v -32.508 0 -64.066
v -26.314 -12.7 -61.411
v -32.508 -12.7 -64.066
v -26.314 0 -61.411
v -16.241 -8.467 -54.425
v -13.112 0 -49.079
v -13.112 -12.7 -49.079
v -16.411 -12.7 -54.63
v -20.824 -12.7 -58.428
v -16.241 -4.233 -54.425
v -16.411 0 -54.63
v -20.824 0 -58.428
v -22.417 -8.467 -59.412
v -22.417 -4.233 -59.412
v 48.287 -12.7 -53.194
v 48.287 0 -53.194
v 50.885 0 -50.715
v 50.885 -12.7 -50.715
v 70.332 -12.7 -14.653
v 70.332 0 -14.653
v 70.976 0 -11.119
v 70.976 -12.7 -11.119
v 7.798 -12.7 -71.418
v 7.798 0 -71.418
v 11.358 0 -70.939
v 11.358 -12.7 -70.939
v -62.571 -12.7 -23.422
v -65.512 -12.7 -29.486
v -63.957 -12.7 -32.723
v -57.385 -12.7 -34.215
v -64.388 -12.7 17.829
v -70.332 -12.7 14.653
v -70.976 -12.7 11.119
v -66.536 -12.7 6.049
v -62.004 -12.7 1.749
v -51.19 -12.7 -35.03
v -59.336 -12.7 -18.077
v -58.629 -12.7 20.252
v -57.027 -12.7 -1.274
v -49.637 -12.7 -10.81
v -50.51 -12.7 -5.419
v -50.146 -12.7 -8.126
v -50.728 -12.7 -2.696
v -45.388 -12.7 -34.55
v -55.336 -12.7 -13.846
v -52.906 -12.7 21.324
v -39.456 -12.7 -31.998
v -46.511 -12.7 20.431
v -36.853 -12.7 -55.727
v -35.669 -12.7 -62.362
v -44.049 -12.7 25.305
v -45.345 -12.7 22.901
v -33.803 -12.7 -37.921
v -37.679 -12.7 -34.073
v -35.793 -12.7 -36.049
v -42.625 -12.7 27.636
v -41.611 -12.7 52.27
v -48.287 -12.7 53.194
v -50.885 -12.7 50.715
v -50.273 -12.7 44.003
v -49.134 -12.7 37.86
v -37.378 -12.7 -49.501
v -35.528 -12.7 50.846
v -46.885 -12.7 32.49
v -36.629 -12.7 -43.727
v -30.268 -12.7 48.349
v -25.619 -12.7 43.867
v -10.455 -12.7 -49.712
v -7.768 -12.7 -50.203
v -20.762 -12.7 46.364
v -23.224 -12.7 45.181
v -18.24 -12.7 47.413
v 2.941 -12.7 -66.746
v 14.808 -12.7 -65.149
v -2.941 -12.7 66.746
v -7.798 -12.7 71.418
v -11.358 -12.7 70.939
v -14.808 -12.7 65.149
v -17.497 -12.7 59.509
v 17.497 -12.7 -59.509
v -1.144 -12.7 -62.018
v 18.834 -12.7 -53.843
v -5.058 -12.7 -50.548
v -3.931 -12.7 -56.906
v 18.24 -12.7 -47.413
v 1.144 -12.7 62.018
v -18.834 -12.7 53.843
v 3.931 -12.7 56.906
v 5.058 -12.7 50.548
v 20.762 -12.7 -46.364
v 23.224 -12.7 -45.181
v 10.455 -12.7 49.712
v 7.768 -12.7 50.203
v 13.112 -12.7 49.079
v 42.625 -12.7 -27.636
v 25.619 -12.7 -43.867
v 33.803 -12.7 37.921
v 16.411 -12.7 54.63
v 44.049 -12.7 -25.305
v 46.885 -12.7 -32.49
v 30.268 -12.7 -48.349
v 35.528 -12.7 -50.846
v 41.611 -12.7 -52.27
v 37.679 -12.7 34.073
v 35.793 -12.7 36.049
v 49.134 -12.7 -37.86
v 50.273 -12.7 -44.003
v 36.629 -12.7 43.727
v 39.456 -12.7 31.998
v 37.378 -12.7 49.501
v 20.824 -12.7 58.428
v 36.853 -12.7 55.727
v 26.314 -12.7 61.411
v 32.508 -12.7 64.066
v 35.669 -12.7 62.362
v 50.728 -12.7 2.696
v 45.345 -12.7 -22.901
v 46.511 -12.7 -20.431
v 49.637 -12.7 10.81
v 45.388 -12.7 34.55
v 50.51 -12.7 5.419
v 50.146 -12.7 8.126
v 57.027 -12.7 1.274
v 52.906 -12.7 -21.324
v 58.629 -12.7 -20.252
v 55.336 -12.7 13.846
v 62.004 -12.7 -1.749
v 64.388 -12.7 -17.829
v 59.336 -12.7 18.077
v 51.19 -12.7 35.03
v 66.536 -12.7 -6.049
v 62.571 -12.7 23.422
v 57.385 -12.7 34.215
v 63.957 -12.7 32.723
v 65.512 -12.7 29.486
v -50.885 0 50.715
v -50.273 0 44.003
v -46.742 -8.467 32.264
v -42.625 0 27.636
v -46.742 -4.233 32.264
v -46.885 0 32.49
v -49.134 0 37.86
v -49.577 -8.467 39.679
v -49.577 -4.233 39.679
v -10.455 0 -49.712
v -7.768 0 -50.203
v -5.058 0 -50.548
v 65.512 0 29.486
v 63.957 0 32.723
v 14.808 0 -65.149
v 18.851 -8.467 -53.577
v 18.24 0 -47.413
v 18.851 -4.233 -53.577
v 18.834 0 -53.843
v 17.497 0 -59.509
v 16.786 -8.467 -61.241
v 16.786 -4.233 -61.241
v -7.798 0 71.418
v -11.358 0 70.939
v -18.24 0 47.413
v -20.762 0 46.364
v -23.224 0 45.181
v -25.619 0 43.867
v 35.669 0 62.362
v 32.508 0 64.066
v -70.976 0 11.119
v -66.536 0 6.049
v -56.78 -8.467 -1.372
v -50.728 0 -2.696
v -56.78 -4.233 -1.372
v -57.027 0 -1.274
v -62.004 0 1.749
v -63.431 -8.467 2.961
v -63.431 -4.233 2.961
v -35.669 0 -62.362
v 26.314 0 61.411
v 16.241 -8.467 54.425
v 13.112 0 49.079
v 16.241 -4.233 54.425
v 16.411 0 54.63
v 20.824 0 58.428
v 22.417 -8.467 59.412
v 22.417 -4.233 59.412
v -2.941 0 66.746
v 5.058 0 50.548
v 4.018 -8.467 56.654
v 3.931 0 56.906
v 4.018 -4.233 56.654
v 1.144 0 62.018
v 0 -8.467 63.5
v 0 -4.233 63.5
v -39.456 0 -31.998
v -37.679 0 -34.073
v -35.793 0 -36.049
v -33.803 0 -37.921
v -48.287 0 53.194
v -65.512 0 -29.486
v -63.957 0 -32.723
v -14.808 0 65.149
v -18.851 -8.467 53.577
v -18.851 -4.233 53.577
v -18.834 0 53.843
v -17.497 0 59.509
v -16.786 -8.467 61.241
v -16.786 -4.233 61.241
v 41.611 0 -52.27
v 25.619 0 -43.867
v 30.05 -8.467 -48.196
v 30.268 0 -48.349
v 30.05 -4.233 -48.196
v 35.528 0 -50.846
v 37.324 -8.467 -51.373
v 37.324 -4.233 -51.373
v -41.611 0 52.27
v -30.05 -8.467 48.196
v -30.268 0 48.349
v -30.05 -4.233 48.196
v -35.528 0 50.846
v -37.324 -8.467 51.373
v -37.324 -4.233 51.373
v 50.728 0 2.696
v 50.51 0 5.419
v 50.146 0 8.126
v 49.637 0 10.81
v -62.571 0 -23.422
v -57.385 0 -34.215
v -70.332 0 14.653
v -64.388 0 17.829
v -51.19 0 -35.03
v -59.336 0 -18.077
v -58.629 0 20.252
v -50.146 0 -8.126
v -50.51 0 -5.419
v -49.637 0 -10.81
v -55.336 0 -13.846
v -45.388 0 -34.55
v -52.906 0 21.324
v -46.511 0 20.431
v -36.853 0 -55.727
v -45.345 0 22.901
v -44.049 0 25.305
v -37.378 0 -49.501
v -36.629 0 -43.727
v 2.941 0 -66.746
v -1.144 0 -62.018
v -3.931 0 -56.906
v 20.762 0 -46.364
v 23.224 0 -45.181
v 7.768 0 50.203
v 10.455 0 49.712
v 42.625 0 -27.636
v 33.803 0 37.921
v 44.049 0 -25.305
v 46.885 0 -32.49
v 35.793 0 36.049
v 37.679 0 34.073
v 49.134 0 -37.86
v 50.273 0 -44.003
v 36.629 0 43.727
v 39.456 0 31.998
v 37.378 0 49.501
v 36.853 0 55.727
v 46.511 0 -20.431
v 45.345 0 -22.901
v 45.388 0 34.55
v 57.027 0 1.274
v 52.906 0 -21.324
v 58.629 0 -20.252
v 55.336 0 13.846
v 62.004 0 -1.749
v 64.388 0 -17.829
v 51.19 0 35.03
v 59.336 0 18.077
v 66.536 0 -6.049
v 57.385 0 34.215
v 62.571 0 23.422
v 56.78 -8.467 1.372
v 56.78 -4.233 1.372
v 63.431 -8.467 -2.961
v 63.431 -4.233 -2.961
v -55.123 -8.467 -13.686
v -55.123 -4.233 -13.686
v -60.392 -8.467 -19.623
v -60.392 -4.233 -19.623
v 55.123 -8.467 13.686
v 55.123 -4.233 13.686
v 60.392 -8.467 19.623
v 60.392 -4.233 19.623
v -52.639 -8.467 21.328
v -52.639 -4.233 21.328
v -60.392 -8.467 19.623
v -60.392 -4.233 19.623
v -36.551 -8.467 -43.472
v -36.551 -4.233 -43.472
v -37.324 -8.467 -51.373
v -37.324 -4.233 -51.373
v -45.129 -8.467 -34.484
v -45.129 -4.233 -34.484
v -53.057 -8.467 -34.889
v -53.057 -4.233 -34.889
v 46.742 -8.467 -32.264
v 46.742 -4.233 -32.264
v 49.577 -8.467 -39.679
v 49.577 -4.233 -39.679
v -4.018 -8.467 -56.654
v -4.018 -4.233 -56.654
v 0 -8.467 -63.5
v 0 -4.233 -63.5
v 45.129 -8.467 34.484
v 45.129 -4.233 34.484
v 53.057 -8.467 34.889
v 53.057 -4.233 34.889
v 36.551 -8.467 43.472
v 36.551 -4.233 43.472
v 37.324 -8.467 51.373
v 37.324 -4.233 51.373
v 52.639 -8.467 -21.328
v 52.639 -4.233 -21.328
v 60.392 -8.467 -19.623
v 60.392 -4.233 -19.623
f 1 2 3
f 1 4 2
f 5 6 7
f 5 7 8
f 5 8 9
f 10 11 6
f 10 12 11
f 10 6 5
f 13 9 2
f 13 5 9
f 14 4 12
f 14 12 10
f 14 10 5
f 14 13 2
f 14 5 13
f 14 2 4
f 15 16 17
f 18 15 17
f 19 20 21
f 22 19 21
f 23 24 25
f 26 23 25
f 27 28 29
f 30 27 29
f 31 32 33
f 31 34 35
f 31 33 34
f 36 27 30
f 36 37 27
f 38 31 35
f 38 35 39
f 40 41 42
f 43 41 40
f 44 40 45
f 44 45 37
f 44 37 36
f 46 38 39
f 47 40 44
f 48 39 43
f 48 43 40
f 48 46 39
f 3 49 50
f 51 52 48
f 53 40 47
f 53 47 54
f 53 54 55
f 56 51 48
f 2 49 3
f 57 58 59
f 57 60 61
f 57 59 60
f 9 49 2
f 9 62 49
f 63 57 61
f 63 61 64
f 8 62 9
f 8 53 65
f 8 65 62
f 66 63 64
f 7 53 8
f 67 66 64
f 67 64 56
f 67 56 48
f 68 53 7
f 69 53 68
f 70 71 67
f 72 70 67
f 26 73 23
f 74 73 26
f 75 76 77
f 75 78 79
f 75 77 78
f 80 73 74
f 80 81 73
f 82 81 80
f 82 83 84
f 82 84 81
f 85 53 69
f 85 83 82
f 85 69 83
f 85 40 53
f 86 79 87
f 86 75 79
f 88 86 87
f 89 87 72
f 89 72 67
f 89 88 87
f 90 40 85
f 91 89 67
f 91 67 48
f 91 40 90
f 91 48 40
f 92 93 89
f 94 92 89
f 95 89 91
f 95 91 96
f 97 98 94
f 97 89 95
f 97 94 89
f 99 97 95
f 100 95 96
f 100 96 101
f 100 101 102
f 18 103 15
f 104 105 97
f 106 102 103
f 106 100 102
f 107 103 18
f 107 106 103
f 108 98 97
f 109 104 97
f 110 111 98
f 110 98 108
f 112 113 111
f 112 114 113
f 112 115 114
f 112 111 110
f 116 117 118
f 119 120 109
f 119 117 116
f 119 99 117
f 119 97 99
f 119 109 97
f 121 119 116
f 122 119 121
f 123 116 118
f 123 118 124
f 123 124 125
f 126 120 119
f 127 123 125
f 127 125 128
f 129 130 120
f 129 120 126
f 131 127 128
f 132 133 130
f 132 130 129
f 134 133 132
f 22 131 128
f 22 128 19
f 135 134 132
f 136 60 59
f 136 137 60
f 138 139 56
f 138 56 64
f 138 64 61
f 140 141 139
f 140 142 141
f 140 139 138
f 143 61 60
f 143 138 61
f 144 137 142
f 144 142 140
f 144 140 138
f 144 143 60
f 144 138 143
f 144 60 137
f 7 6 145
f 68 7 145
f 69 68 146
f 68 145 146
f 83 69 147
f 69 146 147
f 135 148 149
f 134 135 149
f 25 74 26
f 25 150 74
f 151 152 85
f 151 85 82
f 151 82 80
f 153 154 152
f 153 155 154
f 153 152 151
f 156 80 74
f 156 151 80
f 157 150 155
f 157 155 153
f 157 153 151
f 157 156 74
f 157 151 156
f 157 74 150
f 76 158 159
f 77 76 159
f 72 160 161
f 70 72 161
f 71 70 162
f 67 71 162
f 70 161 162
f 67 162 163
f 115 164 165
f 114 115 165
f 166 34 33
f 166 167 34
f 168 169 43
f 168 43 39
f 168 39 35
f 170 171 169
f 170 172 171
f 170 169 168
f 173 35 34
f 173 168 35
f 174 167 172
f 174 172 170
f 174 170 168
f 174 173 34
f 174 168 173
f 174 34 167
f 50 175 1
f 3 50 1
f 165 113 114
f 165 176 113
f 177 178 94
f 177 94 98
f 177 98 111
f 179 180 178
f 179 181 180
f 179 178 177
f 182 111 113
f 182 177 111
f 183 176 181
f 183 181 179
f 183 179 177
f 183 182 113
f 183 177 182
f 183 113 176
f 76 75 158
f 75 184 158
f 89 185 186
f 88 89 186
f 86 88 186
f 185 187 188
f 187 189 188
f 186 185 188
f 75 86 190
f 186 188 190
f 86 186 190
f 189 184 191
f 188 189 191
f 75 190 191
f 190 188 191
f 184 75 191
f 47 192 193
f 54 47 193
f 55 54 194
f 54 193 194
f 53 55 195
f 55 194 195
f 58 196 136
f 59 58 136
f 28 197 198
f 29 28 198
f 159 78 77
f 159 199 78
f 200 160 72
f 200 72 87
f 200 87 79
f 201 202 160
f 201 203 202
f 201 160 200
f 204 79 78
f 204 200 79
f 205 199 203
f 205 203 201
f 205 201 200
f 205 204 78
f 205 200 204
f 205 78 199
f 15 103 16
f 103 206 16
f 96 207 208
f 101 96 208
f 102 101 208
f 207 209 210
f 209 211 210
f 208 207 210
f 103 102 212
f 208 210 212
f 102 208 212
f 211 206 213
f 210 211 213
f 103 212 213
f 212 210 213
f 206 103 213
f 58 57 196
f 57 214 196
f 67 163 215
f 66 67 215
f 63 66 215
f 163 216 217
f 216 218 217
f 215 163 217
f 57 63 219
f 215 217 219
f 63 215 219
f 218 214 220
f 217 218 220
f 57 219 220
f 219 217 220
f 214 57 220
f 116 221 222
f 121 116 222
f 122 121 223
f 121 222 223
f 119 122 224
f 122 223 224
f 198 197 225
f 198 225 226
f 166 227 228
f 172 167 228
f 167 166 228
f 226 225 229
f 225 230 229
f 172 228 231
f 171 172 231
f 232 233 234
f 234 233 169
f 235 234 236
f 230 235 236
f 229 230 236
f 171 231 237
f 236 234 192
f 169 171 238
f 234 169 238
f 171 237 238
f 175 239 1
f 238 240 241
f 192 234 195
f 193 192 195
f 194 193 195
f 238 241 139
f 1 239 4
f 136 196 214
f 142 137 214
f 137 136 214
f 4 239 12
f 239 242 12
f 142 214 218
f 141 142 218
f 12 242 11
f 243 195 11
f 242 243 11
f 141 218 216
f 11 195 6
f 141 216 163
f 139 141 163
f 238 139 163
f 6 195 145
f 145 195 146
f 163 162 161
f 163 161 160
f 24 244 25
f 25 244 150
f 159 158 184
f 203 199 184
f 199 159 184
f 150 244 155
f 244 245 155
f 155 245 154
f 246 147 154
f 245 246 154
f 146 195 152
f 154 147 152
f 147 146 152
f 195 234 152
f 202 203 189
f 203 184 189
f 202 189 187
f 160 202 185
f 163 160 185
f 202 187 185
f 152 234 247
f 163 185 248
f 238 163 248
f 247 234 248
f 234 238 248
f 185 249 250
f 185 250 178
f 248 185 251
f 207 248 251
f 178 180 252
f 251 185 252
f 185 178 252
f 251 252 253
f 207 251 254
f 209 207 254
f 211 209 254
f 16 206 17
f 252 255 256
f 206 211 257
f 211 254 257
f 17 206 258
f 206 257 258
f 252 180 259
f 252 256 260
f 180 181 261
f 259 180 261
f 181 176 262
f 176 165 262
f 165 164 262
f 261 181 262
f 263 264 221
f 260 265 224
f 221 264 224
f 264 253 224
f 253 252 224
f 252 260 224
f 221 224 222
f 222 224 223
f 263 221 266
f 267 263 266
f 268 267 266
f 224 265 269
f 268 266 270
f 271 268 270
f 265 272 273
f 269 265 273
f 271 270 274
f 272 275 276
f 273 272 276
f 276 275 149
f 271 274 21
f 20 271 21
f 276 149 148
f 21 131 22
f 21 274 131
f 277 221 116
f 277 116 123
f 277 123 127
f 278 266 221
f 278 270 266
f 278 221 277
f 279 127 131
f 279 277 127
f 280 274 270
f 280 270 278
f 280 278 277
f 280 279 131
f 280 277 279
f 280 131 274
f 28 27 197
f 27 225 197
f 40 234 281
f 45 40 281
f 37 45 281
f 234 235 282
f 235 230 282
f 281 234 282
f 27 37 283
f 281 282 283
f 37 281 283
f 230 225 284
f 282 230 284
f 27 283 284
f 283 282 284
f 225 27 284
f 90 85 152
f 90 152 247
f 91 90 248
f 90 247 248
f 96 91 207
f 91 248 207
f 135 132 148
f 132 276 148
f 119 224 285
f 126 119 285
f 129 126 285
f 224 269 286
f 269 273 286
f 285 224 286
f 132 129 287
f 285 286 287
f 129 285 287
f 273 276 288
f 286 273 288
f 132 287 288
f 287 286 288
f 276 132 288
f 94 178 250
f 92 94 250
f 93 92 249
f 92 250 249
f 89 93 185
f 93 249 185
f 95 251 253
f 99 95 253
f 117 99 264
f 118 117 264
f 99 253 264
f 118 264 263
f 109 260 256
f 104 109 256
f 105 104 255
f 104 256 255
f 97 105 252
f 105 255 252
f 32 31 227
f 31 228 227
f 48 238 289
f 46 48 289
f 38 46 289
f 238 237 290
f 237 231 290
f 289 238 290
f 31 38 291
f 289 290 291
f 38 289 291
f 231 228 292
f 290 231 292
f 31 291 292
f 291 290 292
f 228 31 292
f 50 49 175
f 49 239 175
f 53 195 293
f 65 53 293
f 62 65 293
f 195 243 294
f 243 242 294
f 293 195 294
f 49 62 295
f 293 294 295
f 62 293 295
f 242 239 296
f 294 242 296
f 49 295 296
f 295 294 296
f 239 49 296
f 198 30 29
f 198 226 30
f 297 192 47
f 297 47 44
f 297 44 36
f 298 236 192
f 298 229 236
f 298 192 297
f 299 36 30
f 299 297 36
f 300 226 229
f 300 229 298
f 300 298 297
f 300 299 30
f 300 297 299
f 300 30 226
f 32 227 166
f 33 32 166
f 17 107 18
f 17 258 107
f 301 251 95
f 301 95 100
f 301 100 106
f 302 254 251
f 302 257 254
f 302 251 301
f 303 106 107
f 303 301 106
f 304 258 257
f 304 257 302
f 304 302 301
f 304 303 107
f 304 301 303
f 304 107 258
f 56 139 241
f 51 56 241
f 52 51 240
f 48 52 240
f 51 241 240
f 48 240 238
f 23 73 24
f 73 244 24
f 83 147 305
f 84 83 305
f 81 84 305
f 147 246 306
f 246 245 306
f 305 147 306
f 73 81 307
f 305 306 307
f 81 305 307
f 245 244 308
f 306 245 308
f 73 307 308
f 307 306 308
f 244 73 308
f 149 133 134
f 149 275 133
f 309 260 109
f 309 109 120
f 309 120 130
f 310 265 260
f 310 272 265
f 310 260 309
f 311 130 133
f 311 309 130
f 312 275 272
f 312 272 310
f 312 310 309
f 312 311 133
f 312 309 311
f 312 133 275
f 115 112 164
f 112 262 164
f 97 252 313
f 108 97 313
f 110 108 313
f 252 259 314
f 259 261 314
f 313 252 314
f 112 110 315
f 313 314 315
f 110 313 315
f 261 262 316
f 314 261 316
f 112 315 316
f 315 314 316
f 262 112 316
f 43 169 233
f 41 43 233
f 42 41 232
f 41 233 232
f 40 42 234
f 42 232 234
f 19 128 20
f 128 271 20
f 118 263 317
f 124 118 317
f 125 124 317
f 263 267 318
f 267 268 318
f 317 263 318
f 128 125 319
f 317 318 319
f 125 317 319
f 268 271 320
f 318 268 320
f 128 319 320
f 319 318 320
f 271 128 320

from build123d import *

# Parameters (mm, degrees)
F1_DEPTH = 12.7
F2_DEPTH = 12.7
F4_COUNT = 10


with BuildPart() as f1:
    # F0 (on Front) → F1 (new body)
    with BuildSketch(Plane.XZ):
        with BuildLine():
            ThreePointArc((-18.2398537228, 47.4125272072), (-28.7580895652, -41.8761541281), (50.8, 0))
            ThreePointArc((50.8, 0), (37.6668973466, 34.0858452188), (5.0580769968, 50.5475603476))
            ThreePointArc((5.0580769968, 50.5475603476), (-6.7747263864, 50.3462320575), (-18.2398537228, 47.4125272072))
        make_face()
    extrude(amount=F1_DEPTH)

    # F0 (on Front) → F2 (join, through all)
    with BuildSketch(Plane.XZ):
        with BuildLine():
            ThreePointArc((-18.2398537228, 47.4125272072), (-6.7747263864, 50.3462320575), (5.0580769968, 50.5475603476))
            add(Edge.make_bspline(
                [(5.0580769968, 50.5475603476), (4.8787158838, 52.5914812168), (4.4897162166, 56.9263105927), (0.1861426341, 63.9548196192), (-4.9903423699, 68.7921425636), (-7.7980468665, 71.4175781238)],
                knots=[0, 0, 0, 0, 0.2880613085, 0.6141610371, 1, 1, 1, 1], degree=3))
            Line((-7.7980468665, 71.4175781238), (-11.3577849389, 70.9385700538))
            add(Edge.make_bspline(
                [(-18.2398537228, 47.4125272072), (-18.6071605924, 49.4311575825), (-19.3778623389, 53.7146240849), (-17.0852769639, 61.6307302623), (-13.371613766, 67.6643358111), (-11.3577849389, 70.9385700538)],
                knots=[0, 0, 0, 0, 0.2880613085, 0.6141610371, 1, 1, 1, 1], degree=3))
        make_face()
    extrude(amount=F2_DEPTH)

    # F4: F1 ×10 about axis
    f4_axis = Axis((0, -10.3239128366, 0), (0, -1, 0))


with BuildPart() as f1_1:
    add(f1.part)
    for i in range(1, F4_COUNT):
        add(f1.part.rotate(f4_axis, i * 360 / F4_COUNT))


solid = f1_1.part
